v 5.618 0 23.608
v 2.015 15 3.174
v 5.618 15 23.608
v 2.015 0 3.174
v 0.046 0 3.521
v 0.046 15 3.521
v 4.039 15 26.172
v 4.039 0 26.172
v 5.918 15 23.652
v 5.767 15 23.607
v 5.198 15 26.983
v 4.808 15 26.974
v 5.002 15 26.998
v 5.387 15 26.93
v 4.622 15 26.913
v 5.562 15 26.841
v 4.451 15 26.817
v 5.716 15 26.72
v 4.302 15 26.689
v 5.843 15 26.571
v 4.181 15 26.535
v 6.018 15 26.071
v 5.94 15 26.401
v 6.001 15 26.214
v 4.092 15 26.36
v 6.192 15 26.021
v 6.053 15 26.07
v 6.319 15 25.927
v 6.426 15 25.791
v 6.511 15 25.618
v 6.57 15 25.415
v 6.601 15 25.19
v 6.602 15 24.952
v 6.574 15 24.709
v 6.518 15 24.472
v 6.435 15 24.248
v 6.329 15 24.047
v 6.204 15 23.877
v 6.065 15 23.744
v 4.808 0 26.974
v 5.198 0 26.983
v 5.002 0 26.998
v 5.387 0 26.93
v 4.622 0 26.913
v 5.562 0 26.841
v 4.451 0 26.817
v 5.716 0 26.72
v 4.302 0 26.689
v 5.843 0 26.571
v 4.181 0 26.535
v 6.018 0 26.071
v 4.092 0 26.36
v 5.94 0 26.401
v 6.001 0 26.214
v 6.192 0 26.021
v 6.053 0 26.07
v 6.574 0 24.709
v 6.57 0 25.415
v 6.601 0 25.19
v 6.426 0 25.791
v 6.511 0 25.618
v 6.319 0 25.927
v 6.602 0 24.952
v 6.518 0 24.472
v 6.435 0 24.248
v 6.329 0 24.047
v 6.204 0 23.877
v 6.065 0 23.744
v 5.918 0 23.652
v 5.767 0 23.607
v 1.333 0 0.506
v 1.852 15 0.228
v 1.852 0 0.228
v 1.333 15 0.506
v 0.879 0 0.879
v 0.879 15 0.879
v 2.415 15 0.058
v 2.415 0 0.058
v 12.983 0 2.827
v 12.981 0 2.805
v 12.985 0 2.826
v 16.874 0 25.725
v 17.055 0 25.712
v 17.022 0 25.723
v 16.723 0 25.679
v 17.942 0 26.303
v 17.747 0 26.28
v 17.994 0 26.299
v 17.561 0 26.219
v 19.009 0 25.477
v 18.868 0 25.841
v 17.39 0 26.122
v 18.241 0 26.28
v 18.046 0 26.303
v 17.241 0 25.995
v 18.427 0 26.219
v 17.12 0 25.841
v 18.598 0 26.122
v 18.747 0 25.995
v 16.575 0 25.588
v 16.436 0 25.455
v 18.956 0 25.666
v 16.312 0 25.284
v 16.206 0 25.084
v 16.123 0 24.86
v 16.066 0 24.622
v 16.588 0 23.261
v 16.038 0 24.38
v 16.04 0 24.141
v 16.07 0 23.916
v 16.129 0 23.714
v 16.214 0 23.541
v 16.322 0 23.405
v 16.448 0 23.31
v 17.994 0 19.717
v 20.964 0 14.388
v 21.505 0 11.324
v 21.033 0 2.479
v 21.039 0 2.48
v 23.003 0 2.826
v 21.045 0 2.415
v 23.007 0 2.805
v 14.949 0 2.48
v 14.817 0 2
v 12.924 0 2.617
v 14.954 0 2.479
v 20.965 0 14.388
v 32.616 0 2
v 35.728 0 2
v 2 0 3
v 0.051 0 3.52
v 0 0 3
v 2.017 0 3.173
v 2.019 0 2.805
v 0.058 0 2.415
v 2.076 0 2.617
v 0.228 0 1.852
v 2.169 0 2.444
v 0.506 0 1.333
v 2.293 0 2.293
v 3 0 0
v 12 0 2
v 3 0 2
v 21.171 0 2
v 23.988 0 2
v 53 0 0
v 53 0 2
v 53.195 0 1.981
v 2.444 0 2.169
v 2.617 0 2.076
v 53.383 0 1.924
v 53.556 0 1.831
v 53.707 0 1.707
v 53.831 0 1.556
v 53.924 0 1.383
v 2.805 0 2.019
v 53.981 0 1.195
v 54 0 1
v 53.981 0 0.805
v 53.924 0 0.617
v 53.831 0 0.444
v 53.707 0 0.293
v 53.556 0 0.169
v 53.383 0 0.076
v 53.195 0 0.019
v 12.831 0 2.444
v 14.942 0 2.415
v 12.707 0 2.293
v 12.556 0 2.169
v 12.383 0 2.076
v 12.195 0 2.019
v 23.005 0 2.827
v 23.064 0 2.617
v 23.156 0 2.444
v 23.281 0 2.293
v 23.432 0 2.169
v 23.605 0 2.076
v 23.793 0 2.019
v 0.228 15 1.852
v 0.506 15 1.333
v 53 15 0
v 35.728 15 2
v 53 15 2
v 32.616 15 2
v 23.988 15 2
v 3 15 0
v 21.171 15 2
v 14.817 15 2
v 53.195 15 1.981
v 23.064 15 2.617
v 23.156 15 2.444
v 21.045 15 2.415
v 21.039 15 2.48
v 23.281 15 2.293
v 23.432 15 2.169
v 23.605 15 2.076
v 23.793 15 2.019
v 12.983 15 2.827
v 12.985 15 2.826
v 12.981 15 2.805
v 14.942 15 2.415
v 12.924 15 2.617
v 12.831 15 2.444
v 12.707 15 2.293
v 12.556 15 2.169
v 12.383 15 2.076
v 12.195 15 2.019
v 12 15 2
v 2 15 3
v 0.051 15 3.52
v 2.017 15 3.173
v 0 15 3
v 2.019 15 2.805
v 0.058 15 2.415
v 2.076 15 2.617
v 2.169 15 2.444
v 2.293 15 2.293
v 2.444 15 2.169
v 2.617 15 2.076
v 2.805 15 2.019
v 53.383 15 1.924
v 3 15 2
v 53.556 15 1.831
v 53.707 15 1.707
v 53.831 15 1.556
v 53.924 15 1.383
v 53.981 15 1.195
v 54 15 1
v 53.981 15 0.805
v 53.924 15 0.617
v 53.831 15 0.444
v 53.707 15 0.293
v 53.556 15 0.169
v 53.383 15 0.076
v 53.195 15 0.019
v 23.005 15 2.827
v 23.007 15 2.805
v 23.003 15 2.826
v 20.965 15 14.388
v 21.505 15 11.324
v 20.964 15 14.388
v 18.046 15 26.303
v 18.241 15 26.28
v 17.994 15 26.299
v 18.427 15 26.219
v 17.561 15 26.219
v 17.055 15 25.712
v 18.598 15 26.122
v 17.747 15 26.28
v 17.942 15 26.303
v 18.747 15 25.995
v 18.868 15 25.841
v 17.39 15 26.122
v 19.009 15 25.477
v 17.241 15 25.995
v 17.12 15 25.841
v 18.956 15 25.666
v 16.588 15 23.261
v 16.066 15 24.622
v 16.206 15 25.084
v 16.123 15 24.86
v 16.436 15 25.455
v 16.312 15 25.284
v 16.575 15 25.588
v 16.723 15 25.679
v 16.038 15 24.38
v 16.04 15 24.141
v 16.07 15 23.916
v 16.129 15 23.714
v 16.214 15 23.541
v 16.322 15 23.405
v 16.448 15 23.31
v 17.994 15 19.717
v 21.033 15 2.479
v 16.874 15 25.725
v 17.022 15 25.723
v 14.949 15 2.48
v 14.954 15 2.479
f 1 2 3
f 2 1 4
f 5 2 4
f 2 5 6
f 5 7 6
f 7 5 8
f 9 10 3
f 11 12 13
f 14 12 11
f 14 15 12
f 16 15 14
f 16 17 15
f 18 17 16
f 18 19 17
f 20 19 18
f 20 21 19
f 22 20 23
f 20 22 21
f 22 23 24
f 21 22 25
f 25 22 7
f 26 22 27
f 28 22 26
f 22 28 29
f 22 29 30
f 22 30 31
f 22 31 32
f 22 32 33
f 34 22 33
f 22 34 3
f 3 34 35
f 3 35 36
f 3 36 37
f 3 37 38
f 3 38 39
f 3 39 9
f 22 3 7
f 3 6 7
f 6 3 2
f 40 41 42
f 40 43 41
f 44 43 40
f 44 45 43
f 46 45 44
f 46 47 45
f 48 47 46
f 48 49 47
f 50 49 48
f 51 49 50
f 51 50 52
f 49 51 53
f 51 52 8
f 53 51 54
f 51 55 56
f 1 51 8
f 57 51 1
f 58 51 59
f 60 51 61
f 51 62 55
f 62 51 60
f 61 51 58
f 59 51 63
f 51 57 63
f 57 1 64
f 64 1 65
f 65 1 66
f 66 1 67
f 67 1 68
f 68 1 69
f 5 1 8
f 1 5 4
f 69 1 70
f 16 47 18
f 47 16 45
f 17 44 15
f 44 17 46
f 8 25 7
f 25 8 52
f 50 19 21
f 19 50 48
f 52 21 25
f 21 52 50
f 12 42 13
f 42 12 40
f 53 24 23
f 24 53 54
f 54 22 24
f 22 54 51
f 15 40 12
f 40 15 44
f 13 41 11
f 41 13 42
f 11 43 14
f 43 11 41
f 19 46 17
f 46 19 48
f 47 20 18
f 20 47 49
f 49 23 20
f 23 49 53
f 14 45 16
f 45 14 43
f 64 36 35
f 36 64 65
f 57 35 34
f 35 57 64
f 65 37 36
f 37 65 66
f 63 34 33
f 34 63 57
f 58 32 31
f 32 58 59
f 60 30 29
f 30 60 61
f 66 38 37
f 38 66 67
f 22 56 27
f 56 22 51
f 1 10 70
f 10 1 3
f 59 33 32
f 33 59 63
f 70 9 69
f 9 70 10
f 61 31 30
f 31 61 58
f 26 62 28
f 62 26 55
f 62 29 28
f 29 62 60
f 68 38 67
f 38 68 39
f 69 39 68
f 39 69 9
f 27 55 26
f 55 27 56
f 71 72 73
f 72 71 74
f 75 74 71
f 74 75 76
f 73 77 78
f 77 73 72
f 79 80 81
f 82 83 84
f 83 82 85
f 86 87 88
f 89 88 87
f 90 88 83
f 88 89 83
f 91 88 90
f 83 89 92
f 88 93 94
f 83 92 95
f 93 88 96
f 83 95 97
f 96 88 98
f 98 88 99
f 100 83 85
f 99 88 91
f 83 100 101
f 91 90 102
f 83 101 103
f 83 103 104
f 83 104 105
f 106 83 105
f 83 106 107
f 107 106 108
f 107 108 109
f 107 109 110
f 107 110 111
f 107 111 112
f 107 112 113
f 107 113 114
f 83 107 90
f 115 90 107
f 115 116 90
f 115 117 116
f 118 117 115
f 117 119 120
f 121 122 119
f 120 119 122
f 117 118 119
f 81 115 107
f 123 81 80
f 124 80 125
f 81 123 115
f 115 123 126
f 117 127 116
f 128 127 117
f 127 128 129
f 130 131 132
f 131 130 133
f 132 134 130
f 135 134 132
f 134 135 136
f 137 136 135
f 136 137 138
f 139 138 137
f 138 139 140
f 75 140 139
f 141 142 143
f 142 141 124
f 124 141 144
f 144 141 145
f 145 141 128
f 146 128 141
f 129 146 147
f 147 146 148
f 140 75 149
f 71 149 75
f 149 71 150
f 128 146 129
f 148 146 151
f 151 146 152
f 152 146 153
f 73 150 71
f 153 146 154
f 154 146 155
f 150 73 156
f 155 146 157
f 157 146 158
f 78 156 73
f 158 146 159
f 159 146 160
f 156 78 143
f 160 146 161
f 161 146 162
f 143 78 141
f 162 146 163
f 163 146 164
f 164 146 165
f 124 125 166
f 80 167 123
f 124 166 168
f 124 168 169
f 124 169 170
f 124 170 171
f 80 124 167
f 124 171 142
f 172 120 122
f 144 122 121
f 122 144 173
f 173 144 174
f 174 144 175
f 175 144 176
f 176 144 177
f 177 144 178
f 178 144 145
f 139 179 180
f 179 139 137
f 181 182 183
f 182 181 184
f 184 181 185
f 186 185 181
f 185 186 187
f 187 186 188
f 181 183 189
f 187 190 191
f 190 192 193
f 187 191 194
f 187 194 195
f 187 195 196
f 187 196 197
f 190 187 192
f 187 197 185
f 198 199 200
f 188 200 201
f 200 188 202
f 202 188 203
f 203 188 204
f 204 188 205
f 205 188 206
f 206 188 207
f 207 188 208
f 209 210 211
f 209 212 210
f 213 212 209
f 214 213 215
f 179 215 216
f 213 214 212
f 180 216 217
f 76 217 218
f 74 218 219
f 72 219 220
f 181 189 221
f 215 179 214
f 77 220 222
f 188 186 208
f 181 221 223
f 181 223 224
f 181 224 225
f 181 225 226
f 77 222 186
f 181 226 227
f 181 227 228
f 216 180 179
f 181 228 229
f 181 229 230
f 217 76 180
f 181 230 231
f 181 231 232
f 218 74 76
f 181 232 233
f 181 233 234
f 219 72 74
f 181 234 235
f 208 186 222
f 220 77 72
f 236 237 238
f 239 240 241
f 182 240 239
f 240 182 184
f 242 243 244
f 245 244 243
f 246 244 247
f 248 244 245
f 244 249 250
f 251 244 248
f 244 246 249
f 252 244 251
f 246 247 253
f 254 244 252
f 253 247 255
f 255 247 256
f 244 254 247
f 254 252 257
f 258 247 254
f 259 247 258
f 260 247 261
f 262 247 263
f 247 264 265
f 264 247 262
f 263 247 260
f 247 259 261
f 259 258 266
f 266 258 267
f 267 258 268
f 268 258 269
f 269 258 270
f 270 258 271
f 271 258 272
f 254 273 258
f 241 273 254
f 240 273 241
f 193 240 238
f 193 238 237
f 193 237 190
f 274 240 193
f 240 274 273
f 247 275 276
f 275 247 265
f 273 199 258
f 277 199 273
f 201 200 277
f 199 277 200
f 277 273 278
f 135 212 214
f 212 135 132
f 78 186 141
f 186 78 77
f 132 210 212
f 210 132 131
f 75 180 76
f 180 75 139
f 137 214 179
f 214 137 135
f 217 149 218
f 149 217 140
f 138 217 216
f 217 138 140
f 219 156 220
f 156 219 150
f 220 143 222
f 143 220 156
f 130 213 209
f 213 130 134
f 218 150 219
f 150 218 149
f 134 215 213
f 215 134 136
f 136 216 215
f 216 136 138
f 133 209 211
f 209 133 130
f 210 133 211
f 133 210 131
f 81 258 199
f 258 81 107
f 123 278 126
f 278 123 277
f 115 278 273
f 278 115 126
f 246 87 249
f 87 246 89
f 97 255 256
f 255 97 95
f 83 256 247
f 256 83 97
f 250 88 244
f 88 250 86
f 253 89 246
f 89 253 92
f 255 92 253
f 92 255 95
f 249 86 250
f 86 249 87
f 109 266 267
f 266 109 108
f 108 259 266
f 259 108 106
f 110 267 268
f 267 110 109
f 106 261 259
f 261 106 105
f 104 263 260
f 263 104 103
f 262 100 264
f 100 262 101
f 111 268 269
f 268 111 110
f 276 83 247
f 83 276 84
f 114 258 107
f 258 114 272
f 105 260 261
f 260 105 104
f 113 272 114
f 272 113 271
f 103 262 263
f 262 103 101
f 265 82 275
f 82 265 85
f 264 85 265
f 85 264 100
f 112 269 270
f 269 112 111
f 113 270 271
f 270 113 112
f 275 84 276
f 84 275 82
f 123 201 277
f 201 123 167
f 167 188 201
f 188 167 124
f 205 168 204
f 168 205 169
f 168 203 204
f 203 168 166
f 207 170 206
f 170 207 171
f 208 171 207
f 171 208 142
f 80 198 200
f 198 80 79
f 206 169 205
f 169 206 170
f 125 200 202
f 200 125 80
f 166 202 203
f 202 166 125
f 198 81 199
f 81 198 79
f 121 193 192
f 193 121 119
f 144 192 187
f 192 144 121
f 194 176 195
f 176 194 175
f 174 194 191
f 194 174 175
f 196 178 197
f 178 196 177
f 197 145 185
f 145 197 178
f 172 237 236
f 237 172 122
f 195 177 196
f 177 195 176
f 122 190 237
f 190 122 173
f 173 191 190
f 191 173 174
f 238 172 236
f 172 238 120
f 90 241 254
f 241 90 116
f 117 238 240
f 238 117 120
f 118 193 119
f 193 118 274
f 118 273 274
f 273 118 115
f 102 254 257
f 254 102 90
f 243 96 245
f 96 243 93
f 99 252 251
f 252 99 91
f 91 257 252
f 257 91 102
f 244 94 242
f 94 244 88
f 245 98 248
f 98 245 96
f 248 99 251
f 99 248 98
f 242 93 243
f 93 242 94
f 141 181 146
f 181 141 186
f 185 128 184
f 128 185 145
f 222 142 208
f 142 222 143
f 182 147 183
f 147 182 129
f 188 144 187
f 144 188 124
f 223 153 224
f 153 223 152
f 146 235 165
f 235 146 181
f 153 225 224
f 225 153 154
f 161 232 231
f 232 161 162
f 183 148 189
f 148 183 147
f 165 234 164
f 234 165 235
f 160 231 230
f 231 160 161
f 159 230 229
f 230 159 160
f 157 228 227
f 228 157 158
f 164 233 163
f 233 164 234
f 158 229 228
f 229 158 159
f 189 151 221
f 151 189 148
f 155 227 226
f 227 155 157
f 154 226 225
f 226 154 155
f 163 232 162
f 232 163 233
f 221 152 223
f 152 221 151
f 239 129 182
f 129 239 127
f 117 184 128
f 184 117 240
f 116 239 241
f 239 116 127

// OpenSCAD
screen = [10.5,350,225];
$fn=32;

t=2;
cr=t*1.5;
a=10;
w=15;
baseL=50;
supportH=23;

// projection(cut = false) 
// screen();

translate([35,0,0]) rotate([0,45-a/2,0]) translate([-20,0,0]) cube([20,w,t]);

brace(a,true);

translate([4.5+screen[0]+sin(a)*supportH,0,0]) {
  translate([-sin(a)*supportH,0,0]) mirror([1,0,0]) brace(-a,true);
  translate([sin(a)*supportH-2,0,0]) brace(-a);
}

rotate([0,90,0]) translate([-t,0,cr]) {
  cube([t,w,baseL]);
  translate([t/2,0,baseL]) rotate([-90,0,0]) cylinder(r=t/2,h=w);
}

module brace(ba,grip=false) {
  translate([cr,0,cr]) rotate([0,ba,0]) translate([-cr,0,0]) {
    cube([t,w,supportH]);
    translate([t/2,0,supportH]) rotate([-90,0,0]) cylinder(r=t/2,h=w);
    if(grip) {
      translate([t,0,supportH-t/2]) rotate([-90,0,0]) scale([0.75,1.25,1]) cylinder(r=t/2,h=w);
    }
  }
  curve(ba);
}

module curve(ba) {
  translate([cr,0,cr]) rotate([-90,0,0]) difference() {
    cylinder(r=cr,h=w);
    translate([0,0,-1]) cylinder(r=cr-t,h=w+2);
    translate([0,-cr,-1]) cube([cr,cr*2,w+2]);
    rotate([0,0,-90+ba]) translate([0,-cr,-1]) cube([cr,cr*2,w+2]);
  }
}

module screen() {
  color("grey") translate([2.25,-2,t*1.7]) rotate([0,a,0]) cube(screen);
}
